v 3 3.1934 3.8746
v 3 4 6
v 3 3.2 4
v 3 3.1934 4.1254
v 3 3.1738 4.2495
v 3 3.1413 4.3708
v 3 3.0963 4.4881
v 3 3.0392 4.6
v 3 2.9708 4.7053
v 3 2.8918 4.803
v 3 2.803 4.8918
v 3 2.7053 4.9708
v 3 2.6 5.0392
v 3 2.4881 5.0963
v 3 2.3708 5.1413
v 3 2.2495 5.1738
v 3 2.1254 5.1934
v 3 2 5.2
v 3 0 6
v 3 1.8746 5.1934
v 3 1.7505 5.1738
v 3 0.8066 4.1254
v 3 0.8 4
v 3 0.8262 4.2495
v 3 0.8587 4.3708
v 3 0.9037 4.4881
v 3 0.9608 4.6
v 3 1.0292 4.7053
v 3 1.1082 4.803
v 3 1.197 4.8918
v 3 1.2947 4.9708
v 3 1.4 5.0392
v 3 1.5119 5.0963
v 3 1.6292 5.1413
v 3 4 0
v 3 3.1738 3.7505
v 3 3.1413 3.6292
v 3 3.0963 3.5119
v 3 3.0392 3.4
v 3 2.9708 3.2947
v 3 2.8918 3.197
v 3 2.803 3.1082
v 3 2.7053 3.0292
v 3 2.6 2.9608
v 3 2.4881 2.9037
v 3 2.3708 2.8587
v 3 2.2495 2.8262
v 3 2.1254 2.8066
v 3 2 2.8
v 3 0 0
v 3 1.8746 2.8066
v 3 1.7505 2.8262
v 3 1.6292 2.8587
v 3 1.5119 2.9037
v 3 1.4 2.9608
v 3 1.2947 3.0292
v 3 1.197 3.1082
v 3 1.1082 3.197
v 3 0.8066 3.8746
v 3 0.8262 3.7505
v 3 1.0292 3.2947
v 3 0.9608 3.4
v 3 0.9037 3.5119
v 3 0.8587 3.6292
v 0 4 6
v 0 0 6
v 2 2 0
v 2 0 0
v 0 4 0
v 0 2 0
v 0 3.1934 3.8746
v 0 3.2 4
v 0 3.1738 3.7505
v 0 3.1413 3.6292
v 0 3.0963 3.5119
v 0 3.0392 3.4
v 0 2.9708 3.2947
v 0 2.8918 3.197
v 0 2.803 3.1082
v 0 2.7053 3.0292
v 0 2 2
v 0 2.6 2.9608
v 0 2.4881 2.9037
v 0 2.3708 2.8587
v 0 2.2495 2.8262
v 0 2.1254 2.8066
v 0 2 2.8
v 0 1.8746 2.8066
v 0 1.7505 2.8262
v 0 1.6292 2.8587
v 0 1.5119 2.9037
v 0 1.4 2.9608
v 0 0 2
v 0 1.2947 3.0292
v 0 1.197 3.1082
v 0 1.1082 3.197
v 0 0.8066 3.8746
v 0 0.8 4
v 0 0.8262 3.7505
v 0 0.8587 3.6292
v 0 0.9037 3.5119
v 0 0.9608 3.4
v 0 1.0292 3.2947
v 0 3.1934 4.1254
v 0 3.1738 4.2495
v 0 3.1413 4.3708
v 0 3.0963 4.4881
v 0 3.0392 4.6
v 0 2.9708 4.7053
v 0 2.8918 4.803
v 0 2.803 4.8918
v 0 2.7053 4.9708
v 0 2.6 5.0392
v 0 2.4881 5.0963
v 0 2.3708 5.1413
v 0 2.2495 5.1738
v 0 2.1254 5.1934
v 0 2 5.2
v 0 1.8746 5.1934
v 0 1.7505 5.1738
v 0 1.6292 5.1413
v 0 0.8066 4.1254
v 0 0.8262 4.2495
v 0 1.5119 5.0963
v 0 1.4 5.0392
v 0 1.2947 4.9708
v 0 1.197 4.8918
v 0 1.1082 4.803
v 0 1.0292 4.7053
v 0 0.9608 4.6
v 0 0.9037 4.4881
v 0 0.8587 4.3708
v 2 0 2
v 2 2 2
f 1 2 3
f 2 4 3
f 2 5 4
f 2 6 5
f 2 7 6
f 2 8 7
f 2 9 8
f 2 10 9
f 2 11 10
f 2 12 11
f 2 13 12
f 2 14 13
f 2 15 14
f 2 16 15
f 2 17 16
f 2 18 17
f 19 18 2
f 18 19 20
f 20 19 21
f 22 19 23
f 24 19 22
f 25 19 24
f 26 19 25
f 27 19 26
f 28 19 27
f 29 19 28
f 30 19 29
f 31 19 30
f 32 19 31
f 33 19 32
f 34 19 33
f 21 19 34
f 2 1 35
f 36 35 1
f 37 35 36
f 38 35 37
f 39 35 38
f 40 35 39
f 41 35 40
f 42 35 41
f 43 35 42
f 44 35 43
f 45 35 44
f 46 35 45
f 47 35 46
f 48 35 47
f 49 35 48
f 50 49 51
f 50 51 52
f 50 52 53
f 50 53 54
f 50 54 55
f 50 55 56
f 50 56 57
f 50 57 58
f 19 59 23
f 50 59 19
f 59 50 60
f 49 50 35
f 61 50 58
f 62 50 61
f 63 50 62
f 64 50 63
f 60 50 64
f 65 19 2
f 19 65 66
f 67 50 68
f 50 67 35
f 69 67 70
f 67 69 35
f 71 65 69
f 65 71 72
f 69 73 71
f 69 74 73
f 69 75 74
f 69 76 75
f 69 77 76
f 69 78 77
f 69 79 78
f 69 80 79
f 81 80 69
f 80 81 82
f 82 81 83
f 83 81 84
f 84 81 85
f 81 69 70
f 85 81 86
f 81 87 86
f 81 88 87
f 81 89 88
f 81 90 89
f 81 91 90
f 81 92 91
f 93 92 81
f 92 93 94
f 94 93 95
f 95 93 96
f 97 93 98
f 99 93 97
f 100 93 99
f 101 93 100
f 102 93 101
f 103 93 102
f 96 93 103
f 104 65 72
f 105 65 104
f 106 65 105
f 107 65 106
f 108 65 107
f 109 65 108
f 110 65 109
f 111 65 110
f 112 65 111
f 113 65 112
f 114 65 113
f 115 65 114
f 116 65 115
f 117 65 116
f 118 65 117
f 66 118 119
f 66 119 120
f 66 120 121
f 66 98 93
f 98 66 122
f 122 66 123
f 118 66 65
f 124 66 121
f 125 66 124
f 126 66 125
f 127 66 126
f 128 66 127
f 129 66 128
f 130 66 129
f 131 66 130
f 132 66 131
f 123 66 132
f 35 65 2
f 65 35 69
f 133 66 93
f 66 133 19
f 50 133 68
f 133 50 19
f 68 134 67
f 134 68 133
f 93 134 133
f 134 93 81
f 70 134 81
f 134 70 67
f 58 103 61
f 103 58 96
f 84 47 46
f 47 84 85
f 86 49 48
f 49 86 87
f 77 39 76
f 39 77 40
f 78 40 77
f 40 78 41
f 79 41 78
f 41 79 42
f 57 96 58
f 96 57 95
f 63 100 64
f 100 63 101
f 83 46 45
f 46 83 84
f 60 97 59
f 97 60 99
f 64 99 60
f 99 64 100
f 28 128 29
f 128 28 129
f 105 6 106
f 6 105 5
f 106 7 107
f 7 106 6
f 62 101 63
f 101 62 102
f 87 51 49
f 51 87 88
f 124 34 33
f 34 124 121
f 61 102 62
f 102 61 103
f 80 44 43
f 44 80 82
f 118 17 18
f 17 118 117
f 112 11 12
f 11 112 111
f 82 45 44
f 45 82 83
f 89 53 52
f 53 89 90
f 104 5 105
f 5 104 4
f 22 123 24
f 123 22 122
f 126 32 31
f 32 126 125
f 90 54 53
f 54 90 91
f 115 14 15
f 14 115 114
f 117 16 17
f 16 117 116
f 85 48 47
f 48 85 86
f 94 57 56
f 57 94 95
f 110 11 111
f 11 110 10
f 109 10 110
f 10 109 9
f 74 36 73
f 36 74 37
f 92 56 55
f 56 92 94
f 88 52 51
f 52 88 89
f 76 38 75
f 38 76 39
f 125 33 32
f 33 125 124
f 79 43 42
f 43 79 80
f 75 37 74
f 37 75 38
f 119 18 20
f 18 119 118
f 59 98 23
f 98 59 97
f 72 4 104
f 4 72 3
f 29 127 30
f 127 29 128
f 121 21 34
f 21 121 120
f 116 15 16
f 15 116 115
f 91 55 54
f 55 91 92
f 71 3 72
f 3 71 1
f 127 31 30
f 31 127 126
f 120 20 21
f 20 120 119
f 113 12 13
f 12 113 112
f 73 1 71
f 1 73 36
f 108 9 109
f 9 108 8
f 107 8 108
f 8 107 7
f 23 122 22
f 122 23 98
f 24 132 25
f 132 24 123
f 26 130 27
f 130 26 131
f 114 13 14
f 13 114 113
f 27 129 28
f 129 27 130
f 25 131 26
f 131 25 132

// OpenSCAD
// RedSprite OpenSCAD Intro
// Small set of commands see https://openscad.org/cheatsheet/index.html
// Author: kevin@kgolding.co.uk

// For each "Part" below, use * to disable before moving onto the next part
// which you enabled by removing the *

// PART 1
// ======

// Simple 3D and cutting out
difference() {
    cube([3,4,6]);
    cube(4, center=true);
    translate([-1, 2, 4]) rotate([0,90,0]) cylinder(5, r=1.2, $fn=60);
}

// Super helpful modifiers
// * disable
// ! show only
// # highlight / debug
// % transparent / background
























// PART 2 - Modules, padding 2D to 3D, loops and hulls
// ===================================================

// MyShape() draws a 3D cube with rounded corners
module MyShape(width=5, depth=5, height=5, r=0.5) {
    linear_extrude(height)
    hull() {
        for (x = [r, width-r]) {
            for (y = [r, depth-r]) {
                translate([x, y, 0]) circle(r, $fn=50);
            }
        }
    }
}

*MyShape(width=10);





















// PART 3 - Making a box with a lid
// ================================

// Box and lid variables
w = 5;      // Width
d = 8;      // Depth
h = 5;      // Height
wall = 0.5; // Wall thickness

module BoxAndLid() {
    // Box
    difference() {
        MyShape(width=w, depth=d, height=h);
        translate([wall, wall, wall]) MyShape(width=w-wall*2, depth=d-wall* 2, height=h);
    }

    // Lid
    *translate([0,0,h]) rotate([-Angle(-180),0,0]) union() {
        MyShape(width=w, depth=d, height=wall);
        translate([wall,wall,-wall]) MyShape(width=w-wall*2, depth=d-wall* 2, height=wall);
    }
}


*BoxAndLid();




























// PART 4 - Custom function and animation
// ======================================

// Angle() returns 0 to x pausing at 0 and x during animation.
// $t varies from 0 to 1 during animation, and we return 0 for the first
// 0.25 of the animation loop, then stepping up to x during the next 0.25 of
// the loop, then stopping for the third quarter of the loop before stepping
// back to 0 at the end of the loop, ready to repeat
function Angle(x = 90)
    = $t <= 0.25? 0
    : $t <= 0.5 ? ($t-0.25)*x*4
    : $t <= 0.75 ? x
    : (1-$t)*x*4;

// Bonus Projection
// =================
*projection(cut=true) translate([0,0,-h/2]) rotate([90,0,0]) BoxAndLid();
